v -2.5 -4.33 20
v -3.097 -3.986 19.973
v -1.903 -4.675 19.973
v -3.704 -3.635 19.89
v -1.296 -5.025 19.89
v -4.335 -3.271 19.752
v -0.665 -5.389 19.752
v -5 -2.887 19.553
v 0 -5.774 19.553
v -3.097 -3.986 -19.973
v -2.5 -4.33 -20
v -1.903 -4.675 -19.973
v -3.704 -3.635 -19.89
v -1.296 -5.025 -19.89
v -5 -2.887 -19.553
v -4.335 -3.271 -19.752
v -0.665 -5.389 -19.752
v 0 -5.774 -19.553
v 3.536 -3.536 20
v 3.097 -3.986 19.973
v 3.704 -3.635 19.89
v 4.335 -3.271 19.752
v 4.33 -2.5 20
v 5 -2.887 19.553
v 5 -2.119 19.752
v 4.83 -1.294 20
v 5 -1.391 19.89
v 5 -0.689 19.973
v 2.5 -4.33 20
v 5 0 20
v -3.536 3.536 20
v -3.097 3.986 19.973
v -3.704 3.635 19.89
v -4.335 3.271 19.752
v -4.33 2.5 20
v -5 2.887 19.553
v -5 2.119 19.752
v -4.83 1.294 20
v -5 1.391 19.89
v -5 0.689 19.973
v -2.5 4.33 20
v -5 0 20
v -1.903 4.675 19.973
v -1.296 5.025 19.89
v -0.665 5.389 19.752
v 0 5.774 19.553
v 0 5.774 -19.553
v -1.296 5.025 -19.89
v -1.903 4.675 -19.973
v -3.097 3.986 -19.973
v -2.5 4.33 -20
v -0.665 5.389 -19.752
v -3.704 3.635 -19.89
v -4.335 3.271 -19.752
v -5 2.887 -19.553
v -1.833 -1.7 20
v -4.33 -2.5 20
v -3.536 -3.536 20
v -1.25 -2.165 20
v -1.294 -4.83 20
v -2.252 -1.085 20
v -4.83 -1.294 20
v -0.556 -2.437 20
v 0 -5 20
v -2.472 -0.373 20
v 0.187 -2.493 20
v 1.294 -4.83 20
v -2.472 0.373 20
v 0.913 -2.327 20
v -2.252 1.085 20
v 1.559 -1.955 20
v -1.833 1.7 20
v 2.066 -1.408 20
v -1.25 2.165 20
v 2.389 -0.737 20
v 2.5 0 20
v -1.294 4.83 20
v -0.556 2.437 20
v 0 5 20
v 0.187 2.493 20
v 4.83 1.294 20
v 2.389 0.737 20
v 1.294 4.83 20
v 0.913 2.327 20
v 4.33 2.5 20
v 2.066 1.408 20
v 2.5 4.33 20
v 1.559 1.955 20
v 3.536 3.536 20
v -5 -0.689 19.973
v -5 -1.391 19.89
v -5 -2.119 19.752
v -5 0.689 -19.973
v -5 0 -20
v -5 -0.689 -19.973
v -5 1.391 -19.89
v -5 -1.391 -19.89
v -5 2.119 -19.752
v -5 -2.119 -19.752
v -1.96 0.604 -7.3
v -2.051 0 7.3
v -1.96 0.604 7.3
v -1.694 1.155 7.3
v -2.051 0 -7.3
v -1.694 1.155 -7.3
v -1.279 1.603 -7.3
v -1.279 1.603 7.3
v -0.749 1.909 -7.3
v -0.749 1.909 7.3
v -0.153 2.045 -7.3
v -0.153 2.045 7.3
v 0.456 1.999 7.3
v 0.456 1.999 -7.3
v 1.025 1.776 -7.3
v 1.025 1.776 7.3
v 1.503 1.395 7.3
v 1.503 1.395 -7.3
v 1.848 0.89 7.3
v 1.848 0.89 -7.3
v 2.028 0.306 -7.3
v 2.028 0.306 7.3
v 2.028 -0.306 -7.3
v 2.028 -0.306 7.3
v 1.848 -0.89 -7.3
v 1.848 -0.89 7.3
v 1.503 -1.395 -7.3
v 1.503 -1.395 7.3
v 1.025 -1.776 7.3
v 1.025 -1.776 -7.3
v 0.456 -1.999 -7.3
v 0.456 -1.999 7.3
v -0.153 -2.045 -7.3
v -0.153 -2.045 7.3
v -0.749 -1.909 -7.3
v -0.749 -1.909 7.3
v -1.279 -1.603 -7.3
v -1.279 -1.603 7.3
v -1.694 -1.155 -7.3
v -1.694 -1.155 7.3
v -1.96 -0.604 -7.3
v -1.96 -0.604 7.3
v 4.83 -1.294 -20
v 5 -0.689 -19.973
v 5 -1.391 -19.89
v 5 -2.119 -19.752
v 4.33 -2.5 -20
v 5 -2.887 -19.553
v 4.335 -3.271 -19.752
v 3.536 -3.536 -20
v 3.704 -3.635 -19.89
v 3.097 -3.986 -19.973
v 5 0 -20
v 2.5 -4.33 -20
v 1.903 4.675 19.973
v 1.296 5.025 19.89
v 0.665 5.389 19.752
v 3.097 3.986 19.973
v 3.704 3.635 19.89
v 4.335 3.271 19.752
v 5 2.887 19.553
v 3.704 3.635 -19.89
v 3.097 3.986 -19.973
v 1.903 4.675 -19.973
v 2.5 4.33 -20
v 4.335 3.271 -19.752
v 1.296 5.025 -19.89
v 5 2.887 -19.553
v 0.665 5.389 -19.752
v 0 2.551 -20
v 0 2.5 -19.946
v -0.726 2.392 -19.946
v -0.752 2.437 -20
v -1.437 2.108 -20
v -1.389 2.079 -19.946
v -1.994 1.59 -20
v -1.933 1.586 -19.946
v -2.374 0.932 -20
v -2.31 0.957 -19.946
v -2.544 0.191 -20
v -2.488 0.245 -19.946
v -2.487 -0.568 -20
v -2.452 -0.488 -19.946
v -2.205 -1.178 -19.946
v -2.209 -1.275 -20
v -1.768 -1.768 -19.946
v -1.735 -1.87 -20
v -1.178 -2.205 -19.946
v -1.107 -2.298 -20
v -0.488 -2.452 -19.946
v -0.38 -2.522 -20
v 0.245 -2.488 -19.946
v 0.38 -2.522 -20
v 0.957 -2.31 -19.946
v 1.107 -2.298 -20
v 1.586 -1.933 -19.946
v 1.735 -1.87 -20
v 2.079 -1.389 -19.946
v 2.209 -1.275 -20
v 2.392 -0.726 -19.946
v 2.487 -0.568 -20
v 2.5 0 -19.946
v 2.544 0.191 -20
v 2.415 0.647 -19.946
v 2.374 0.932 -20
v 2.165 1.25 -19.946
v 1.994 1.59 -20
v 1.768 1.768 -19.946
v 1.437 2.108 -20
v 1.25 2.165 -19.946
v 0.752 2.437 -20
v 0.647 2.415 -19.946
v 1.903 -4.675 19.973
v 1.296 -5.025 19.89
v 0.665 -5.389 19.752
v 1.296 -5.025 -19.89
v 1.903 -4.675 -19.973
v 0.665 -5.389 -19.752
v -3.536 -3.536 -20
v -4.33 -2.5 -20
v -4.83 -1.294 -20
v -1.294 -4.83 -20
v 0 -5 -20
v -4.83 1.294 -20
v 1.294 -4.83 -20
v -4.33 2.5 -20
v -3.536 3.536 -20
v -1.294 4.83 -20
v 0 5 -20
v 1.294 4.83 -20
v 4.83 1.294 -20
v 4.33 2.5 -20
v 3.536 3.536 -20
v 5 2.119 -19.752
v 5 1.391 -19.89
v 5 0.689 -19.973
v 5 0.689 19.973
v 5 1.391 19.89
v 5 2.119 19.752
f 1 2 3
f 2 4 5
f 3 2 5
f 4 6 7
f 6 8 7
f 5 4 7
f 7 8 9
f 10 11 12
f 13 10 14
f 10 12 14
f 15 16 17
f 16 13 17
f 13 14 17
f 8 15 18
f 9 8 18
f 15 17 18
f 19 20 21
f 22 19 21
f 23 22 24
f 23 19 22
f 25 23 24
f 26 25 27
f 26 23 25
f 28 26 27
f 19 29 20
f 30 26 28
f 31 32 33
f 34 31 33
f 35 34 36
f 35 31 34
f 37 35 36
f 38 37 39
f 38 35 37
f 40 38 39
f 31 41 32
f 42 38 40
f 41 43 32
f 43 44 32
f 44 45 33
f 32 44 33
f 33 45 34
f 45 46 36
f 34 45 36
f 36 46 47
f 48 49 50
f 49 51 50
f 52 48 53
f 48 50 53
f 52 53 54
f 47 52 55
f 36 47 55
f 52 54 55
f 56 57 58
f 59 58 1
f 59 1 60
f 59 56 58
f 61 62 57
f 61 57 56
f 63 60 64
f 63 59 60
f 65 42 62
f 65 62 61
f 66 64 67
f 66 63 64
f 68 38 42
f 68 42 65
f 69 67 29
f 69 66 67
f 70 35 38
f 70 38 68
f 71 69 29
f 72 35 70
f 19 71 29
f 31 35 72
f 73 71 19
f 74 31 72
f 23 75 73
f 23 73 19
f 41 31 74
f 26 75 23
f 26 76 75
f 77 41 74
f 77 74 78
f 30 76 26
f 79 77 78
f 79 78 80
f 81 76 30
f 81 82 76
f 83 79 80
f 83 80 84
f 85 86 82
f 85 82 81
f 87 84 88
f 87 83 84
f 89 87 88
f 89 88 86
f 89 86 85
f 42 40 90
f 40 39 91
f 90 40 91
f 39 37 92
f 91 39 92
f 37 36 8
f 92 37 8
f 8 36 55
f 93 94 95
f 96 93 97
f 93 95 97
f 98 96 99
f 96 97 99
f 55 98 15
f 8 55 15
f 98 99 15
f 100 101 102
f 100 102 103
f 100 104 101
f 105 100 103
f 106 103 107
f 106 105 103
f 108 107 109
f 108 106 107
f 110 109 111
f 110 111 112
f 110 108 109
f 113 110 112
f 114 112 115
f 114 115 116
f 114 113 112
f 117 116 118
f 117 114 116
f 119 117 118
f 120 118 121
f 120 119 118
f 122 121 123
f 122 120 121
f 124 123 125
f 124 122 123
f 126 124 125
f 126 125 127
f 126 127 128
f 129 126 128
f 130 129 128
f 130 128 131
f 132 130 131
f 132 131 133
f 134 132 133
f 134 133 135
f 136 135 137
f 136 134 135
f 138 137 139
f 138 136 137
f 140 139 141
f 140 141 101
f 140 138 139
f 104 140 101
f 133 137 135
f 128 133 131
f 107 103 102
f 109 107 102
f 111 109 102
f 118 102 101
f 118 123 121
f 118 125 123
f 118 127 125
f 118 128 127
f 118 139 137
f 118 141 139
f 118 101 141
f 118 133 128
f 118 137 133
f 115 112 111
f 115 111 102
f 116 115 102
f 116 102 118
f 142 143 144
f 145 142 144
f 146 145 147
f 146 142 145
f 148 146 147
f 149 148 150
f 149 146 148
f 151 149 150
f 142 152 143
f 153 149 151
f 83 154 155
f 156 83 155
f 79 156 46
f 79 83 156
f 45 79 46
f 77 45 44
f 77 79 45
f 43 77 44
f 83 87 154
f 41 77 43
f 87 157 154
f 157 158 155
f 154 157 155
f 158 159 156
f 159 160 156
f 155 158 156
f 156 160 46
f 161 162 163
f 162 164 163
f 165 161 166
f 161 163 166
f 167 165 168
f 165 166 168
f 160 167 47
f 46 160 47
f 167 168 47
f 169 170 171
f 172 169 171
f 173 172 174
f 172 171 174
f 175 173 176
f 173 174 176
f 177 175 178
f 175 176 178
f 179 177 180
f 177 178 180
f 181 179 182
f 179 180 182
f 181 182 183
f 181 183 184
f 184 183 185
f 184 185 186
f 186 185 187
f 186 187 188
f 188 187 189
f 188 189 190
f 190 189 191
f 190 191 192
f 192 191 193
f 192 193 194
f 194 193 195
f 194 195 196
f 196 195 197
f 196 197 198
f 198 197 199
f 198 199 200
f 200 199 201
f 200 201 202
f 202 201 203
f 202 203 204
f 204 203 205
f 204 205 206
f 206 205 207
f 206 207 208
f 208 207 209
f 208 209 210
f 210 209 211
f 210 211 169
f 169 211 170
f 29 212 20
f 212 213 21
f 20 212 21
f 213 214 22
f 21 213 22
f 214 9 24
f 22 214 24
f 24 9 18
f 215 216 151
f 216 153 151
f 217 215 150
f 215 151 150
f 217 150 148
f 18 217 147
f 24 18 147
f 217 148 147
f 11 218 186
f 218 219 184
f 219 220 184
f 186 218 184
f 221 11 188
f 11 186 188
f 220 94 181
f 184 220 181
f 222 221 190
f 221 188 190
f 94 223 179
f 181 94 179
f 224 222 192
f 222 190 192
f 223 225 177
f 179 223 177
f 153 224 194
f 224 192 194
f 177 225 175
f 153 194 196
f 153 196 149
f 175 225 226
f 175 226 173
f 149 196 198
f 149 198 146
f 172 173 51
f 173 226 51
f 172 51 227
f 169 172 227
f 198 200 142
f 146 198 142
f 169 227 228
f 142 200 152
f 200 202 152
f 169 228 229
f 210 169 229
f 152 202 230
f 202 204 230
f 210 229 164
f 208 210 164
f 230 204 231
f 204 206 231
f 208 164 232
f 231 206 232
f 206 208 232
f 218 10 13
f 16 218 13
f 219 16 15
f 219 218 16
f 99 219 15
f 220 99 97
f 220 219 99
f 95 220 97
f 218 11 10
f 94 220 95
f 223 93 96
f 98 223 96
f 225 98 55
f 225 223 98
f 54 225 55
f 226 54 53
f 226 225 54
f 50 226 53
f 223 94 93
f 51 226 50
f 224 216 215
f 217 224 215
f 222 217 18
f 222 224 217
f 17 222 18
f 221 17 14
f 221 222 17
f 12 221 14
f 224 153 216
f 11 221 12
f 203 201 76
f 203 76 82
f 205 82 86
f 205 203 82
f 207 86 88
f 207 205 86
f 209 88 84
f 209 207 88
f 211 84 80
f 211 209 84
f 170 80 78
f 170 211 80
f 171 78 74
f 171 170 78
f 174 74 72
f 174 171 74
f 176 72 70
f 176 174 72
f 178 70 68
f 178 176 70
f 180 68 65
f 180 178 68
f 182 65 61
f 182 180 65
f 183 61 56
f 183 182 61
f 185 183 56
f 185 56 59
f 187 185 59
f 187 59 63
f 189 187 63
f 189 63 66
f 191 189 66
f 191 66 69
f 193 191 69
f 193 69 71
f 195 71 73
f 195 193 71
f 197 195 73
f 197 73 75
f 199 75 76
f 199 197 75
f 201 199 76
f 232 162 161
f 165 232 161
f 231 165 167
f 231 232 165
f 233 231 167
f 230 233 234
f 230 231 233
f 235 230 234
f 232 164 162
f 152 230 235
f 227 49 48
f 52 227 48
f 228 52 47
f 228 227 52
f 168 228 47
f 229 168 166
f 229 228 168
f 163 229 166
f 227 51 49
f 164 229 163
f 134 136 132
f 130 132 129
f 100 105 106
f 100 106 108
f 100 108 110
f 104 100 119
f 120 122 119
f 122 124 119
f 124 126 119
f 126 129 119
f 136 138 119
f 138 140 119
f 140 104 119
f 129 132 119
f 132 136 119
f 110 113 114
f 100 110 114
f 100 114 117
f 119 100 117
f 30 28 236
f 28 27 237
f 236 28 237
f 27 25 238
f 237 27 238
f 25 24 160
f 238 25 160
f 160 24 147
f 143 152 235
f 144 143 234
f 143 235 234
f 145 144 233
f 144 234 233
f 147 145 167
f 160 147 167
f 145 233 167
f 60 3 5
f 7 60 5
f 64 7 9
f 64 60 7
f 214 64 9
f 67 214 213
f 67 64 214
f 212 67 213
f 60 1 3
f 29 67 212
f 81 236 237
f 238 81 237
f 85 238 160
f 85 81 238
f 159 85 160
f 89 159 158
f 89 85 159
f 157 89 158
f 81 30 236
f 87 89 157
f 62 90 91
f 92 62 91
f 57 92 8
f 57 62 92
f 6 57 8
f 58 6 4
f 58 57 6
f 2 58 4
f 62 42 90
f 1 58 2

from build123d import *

# Parameters (mm, degrees)
EXTRUDE1_DEPTH          = 20
EXTRUDE1_DEPTH_BACK     = 20
SKETCH1_R               = 2.5
SKETCH8_OUTSIDE_W       = 165.094
SKETCH8_OUTSIDE_H       = 166.642
SKETCH8_OUTSIDE_R       = 5
EXTRUDE4_DEPTH          = 41.722639076
EXTRUDE4_DRAFT          = -60
MIRROR1_COPY_1_SKETCH_W = 165.094
MIRROR1_COPY_1_SKETCH_H = 166.642
MIRROR1_COPY_1_SKETCH_R = 5
MIRROR1_COPY_1_DEPTH    = 41.722639076
MIRROR1_COPY_1_DRAFT    = -60
SKETCH9_W               = 14.6
SKETCH9_H               = 2.0508


with BuildPart() as part:
    # Sketch1 → Extrude1 (new, two sides: drawn at the far end of the back side and taken through both)
    with BuildSketch(Plane.XY.offset(-EXTRUDE1_DEPTH_BACK)):
        Polygon((0, 5.773502692), (-5, 2.886751346), (-5, -2.886751346), (0, -5.773502692), (5, -2.886751346), (5, 2.886751346), align=None)
        Circle(SKETCH1_R, mode=Mode.SUBTRACT)
    extrude(amount=EXTRUDE1_DEPTH + EXTRUDE1_DEPTH_BACK)

    # Extrude3 cone 1 section (through the dimple's axis) → Extrude3 (revolve, cut)
    with BuildSketch(Plane(origin=(0, 0, -20), x_dir=(0, 1, 0), z_dir=(1, 0, 0))):
        Polygon((0, 0), (2.5508, 0), (0, 2.735398106), align=None)
    revolve(axis=Axis((0, 0, -20), (0, 0, 1)), mode=Mode.SUBTRACT)


with BuildPart() as extrude4_tool:
    # Sketch8 outside → Extrude4 (with draft: the straight prism first)
    with BuildSketch(Plane(origin=(0, 0, -20), x_dir=(-1, 0, 0), z_dir=(0, 0, -1))):
        Rectangle(SKETCH8_OUTSIDE_W, SKETCH8_OUTSIDE_H)
        Circle(SKETCH8_OUTSIDE_R, mode=Mode.SUBTRACT)
    extrude(amount=-EXTRUDE4_DEPTH)
    # Extrude4: the draft: its side faces are tilted about the plane it starts from
    extrude4_sides = [extrude4_tool.faces().sort_by_distance(p)[0] for p in [
        (0, -83.321, 0.861319538),
        (-82.547, 0, 0.861319538),
        (0, 83.321, 0.861319538),
        (82.547, 0, 0.861319538),
        (5, 0, 0.861319538),
    ]]
    draft(extrude4_sides, Plane(origin=(0, 0, -20), x_dir=(-1, 0, 0), z_dir=(0, 0, -1)), EXTRUDE4_DRAFT)


with BuildPart() as part_1:
    add(part.part)

    # Extrude4: cut by extrude4_tool
    add(extrude4_tool.part, mode=Mode.SUBTRACT)


with BuildPart() as mirror1_copy_1_tool:
    # Mirror1 copy 1 sketch → Mirror1 copy 1 (with draft: the straight prism first)
    with BuildSketch(Plane(origin=(0, 0, 20), x_dir=(-1, 0, 0), z_dir=(0, 0, 1))):
        Rectangle(MIRROR1_COPY_1_SKETCH_W, MIRROR1_COPY_1_SKETCH_H)
        Circle(MIRROR1_COPY_1_SKETCH_R, mode=Mode.SUBTRACT)
    extrude(amount=-MIRROR1_COPY_1_DEPTH)
    # Mirror1 copy 1: the draft: its side faces are tilted about the plane it starts from
    mirror1_copy_1_sides = [mirror1_copy_1_tool.faces().sort_by_distance(p)[0] for p in [
        (0, -83.321, -0.861319538),
        (-82.547, 0, -0.861319538),
        (0, 83.321, -0.861319538),
        (82.547, 0, -0.861319538),
        (5, 0, -0.861319538),
    ]]
    draft(mirror1_copy_1_sides, Plane(origin=(0, 0, 20), x_dir=(-1, 0, 0), z_dir=(0, 0, 1)), MIRROR1_COPY_1_DRAFT)


with BuildPart() as part_2:
    add(part_1.part)

    # Mirror1 copy 1: cut by mirror1_copy_1_tool
    add(mirror1_copy_1_tool.part, mode=Mode.SUBTRACT)


with BuildPart() as body_2:
    # Sketch9 → Revolve 2 (revolve)
    with BuildSketch(Plane(origin=(0, 0, 0), x_dir=(0, 0, -1), z_dir=(1, 0, 0)), mode=Mode.PRIVATE) as revolve_2_sk:
        with Locations((0, 1.0254)):
            Rectangle(SKETCH9_W, SKETCH9_H)
    revolve(revolve_2_sk.sketch.rotate(Axis((0, 0, 20), (0, 0, -1)), 270), axis=Axis((0, 0, 20), (0, 0, -1)))


solid = Compound([part_2.part, body_2.part])
